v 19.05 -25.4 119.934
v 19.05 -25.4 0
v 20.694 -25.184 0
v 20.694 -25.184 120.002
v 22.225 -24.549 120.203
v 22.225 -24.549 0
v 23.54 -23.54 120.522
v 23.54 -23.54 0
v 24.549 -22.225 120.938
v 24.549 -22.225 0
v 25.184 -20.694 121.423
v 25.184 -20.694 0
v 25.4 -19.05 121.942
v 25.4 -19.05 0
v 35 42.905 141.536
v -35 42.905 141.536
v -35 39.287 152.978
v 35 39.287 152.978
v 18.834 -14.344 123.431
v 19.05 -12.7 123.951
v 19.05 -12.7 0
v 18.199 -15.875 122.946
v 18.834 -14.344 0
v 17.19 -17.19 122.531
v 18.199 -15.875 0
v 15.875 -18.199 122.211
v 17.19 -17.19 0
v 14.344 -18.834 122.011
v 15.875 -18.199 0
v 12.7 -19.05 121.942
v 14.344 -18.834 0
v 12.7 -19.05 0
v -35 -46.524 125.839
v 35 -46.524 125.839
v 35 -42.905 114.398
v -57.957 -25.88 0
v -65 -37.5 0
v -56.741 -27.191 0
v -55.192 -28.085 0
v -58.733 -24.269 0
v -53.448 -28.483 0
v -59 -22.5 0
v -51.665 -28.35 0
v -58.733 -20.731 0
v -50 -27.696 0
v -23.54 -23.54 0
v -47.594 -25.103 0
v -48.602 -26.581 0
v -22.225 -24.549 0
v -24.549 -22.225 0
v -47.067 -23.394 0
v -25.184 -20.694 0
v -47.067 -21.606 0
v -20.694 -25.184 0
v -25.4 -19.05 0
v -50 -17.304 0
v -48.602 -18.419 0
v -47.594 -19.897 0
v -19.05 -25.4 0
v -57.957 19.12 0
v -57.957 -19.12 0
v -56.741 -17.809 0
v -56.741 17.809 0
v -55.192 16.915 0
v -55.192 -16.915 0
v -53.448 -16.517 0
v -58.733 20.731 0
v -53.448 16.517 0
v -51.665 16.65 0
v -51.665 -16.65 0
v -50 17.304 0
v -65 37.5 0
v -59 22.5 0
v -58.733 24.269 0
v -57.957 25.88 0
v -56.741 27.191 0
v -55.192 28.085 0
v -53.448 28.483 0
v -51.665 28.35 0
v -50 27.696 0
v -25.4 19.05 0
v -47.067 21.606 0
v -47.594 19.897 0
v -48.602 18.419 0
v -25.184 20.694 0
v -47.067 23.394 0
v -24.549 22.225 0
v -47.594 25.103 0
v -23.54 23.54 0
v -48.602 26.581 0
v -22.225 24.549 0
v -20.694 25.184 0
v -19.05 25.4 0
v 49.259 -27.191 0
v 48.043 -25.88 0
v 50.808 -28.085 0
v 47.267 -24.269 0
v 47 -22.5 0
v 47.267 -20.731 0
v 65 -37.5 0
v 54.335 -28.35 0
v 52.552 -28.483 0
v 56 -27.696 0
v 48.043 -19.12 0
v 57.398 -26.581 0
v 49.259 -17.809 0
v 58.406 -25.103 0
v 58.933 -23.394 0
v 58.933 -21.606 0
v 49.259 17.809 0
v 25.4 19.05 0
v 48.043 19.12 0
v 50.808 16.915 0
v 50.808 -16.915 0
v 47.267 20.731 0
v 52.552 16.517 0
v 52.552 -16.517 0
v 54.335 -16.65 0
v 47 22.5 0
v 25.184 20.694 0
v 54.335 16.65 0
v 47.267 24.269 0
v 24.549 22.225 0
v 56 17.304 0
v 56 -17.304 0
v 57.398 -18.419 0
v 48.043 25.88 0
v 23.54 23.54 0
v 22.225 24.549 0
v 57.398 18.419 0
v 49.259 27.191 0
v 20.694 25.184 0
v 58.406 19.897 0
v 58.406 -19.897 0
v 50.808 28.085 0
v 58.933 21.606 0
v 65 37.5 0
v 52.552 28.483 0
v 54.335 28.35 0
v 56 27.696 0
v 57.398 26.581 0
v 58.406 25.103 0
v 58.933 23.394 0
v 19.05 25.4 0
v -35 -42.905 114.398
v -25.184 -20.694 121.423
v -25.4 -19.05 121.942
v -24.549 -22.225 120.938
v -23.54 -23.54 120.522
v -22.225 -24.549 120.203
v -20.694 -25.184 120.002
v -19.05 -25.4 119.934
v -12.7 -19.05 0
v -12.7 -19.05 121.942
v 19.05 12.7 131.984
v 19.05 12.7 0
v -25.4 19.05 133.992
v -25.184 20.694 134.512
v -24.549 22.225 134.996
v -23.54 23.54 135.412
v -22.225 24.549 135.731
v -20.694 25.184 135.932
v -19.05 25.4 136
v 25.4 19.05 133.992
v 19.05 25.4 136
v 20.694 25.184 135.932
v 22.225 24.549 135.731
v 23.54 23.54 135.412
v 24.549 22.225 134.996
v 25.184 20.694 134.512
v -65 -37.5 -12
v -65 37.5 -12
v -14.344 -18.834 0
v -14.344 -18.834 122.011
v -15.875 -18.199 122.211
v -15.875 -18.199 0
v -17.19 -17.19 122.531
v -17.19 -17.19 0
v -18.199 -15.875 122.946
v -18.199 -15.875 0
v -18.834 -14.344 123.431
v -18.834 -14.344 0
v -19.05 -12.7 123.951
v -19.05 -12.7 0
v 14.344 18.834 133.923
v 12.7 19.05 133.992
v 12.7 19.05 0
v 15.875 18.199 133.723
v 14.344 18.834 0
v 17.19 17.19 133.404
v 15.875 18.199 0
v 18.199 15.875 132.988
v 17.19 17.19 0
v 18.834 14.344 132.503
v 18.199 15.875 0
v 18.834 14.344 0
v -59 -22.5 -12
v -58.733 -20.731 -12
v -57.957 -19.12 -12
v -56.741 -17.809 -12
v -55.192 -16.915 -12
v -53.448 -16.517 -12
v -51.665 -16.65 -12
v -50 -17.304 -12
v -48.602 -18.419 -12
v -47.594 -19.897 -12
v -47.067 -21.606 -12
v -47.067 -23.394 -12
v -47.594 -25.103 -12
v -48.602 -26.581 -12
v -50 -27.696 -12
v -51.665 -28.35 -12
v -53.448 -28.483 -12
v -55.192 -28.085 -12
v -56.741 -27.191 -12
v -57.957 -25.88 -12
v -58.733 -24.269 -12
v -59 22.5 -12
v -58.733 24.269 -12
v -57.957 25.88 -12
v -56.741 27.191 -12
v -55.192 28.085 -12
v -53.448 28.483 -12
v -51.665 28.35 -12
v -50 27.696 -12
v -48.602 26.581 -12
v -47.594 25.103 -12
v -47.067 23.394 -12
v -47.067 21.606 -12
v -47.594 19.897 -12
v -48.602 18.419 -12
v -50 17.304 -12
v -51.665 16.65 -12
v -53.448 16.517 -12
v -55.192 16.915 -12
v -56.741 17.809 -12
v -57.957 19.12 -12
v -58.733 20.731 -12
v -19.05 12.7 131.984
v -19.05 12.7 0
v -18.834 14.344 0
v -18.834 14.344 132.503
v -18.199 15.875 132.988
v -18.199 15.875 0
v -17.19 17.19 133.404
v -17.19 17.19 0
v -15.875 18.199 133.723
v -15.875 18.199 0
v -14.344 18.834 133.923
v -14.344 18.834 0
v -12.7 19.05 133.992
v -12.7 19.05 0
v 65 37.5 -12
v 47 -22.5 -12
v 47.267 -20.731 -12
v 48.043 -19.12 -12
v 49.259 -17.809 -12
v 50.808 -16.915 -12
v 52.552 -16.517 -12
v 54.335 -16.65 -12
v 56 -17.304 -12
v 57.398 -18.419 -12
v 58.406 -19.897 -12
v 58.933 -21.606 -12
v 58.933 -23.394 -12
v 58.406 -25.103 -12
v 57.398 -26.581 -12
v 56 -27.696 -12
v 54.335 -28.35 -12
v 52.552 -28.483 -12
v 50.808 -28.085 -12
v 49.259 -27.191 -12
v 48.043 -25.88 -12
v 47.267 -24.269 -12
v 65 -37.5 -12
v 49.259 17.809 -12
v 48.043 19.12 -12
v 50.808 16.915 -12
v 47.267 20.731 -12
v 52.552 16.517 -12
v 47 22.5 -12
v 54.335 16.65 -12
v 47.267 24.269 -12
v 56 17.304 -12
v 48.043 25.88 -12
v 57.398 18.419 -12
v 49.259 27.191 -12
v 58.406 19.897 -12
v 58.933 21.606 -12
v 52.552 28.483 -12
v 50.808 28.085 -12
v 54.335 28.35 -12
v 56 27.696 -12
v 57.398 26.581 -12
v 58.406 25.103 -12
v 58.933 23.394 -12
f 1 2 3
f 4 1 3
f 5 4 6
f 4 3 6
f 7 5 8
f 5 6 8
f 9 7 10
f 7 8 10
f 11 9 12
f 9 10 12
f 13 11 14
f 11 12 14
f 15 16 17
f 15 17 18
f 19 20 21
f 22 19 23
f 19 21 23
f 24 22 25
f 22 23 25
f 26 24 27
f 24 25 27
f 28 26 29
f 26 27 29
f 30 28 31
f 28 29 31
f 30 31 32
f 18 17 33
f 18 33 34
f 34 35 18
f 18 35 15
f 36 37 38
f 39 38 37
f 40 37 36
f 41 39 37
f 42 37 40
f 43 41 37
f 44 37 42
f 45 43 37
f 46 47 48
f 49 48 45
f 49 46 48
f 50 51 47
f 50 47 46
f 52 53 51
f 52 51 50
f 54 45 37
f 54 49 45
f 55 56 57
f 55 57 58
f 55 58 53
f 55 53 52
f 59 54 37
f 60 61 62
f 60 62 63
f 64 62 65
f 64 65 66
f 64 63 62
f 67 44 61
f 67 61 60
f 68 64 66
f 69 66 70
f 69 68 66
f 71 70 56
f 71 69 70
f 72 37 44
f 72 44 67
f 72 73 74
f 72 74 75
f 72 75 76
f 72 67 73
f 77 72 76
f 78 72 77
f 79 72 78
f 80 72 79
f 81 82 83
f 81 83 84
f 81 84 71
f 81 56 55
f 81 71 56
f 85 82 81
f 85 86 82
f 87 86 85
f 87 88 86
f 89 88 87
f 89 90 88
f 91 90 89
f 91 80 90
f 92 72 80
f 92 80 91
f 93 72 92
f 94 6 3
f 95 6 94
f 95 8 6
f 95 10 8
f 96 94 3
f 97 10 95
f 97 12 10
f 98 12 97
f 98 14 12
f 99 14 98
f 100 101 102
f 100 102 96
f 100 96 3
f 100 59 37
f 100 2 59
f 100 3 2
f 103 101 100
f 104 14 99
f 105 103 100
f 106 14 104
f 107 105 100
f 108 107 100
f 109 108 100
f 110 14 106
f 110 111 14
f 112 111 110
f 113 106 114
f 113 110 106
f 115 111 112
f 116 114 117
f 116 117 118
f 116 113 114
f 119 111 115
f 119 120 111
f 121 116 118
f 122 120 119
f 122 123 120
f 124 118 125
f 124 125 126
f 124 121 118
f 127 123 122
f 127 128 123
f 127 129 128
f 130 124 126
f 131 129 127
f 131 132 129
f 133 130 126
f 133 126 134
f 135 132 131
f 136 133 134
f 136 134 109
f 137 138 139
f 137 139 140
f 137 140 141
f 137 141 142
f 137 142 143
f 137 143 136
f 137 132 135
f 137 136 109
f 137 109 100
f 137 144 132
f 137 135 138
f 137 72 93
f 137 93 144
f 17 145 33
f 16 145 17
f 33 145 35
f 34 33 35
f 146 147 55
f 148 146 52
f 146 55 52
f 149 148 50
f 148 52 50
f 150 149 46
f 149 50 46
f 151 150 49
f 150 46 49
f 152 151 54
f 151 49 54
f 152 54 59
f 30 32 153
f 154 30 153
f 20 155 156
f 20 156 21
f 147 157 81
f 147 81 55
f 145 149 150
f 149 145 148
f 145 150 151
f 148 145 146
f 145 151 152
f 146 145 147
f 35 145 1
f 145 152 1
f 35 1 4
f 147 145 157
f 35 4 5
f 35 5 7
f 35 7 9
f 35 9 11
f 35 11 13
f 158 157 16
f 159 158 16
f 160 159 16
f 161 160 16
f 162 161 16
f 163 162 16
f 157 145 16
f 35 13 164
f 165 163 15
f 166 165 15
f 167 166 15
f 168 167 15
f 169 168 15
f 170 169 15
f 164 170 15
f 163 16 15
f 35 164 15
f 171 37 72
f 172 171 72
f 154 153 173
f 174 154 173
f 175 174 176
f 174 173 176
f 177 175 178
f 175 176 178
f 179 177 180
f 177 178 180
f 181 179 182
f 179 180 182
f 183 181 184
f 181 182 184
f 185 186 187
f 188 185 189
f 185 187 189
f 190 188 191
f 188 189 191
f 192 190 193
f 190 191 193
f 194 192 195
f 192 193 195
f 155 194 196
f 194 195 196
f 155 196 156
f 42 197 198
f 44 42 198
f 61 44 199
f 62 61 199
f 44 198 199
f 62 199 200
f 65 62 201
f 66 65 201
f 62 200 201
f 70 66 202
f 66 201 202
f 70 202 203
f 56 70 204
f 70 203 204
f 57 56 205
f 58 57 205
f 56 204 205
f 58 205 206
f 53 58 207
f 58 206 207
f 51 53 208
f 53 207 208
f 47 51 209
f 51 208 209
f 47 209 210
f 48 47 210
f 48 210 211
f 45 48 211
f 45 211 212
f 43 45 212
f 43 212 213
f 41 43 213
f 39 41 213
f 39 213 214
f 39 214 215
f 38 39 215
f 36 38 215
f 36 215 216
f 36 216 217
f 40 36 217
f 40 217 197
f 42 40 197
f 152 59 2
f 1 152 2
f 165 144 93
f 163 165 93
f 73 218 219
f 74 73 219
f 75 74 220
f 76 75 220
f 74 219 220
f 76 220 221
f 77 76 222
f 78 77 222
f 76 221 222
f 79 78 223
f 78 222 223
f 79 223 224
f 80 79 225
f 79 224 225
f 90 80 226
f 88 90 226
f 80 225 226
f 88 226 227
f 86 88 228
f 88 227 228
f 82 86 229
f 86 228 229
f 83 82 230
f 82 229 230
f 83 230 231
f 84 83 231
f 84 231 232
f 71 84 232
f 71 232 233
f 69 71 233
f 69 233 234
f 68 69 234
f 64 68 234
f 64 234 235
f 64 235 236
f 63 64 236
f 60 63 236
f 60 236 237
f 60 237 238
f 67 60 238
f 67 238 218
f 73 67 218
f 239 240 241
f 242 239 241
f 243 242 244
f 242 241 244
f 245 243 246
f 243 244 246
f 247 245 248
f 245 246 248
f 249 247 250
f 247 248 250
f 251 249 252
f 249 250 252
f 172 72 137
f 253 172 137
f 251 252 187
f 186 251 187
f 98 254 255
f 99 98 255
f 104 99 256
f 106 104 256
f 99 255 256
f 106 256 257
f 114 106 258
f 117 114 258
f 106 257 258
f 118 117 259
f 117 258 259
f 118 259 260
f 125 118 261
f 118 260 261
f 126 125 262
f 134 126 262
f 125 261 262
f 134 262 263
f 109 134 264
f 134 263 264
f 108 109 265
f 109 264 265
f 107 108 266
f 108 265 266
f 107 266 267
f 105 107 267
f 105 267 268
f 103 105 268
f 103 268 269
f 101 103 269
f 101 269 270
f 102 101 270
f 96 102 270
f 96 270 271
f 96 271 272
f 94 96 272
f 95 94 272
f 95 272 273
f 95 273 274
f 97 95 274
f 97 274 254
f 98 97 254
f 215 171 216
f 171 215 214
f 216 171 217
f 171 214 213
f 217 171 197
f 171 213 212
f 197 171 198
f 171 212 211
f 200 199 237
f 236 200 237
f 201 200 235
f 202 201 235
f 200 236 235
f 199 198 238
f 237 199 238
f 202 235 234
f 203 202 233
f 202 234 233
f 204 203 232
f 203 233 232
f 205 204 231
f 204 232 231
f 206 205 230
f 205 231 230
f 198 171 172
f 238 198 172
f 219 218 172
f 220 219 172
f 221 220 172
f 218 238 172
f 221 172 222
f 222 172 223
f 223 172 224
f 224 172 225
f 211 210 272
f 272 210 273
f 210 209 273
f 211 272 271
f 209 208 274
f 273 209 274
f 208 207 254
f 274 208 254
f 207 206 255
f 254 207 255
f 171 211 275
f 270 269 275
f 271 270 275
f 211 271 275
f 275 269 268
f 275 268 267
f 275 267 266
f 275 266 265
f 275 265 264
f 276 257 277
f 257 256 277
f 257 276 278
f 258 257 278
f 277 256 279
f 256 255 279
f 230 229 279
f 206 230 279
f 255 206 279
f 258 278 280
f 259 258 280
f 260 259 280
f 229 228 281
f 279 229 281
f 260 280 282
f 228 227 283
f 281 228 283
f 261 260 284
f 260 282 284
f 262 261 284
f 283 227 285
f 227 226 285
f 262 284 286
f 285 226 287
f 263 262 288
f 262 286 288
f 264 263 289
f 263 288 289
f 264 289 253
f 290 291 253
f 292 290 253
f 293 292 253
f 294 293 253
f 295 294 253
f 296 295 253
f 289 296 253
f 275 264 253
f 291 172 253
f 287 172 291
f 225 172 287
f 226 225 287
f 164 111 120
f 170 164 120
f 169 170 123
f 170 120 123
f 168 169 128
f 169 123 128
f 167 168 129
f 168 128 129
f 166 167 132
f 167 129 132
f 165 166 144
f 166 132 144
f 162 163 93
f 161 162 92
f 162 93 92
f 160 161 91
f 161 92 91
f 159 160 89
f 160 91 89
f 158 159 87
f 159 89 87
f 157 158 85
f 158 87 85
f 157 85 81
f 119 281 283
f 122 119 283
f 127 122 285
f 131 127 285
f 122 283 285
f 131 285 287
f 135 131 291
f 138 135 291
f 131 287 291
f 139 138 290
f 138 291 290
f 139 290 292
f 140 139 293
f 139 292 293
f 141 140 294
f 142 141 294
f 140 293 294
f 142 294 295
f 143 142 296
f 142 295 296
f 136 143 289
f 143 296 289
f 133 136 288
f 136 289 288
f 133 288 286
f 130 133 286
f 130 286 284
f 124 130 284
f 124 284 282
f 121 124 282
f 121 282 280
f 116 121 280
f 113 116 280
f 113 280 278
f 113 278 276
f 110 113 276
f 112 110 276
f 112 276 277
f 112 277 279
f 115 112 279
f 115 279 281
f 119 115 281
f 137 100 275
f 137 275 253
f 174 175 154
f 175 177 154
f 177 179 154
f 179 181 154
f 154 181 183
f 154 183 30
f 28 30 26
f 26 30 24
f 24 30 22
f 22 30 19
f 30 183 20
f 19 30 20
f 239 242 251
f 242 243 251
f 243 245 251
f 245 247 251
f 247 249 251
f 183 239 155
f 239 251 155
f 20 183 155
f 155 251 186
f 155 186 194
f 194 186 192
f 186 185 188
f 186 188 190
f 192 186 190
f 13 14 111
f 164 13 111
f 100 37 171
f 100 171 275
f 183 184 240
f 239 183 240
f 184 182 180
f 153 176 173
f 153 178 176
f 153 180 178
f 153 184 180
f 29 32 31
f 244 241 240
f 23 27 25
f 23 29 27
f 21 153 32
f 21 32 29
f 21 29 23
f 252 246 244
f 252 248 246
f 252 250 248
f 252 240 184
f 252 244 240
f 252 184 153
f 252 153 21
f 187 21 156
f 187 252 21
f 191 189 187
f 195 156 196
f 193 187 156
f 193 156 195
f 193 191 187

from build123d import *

# Parameters (mm, degrees)
F0_W     = 130
F0_H     = 75
F1_DEPTH = 12
F3_DEPTH = 136
F5_D     = 12
F7_DEPTH = 50.8
F8_W     = 70
F8_H     = 90
F9_DEPTH = 12


with BuildPart() as f1:
    # F0 (on Top) → F1 (new body)
    with BuildSketch(Plane.XY):
        Rectangle(F0_W, F0_H)
    extrude(amount=-F1_DEPTH)

    # F2 (on face) → F3 (join)
    with BuildSketch(Plane.XY):
        with BuildLine():
            Line((-19.05, -25.4), (19.05, -25.4))
            ThreePointArc((19.05, -25.4), (23.5401280605, -23.5401280605), (25.4, -19.05))
            Line((25.4, -19.05), (25.4, 19.05))
            ThreePointArc((25.4, 19.05), (23.5401280605, 23.5401280605), (19.05, 25.4))
            Line((19.05, 25.4), (-19.05, 25.4))
            ThreePointArc((-19.05, 25.4), (-23.5401280605, 23.5401280605), (-25.4, 19.05))
            Line((-25.4, 19.05), (-25.4, -19.05))
            ThreePointArc((-25.4, -19.05), (-23.5401280605, -23.5401280605), (-19.05, -25.4))
        make_face()
        with BuildLine():
            Line((-12.7, 19.05), (12.7, 19.05))
            ThreePointArc((12.7, 19.05), (17.1901280605, 17.1901280605), (19.05, 12.7))
            Line((19.05, 12.7), (19.05, -12.7))
            ThreePointArc((19.05, -12.7), (17.1901280605, -17.1901280605), (12.7, -19.05))
            Line((12.7, -19.05), (-12.7, -19.05))
            ThreePointArc((-12.7, -19.05), (-17.1901280605, -17.1901280605), (-19.05, -12.7))
            Line((-19.05, -12.7), (-19.05, 12.7))
            ThreePointArc((-19.05, 12.7), (-17.1901280605, 17.1901280605), (-12.7, 19.05))
        make_face(mode=Mode.SUBTRACT)
    extrude(amount=F3_DEPTH)

    # F5 (through all)
    with Locations(Plane.XY):
        with Locations((-53, 22.5), (53, 22.5), (53, -22.5), (-53, -22.5)):
            Hole(F5_D / 2)

    # F6 (on face) → F7 (cut)
    with BuildSketch(Plane.YZ.offset(25.4)):
        Polygon((-19.05, 136), (-25.4, 136), (-25.4, 119.9340696072), (-19.05, 121.9423109063), align=None)
        Polygon((19.05, 136), (-19.05, 136), (-19.05, 121.9423109063), (19.05, 133.9917587009), align=None)
        Polygon((25.4, 136), (19.05, 136), (19.05, 133.9917587009), align=None)
    extrude(amount=-F7_DEPTH, mode=Mode.SUBTRACT)

    # F8 (on face) → F9 (join)
    with BuildSketch(Plane(origin=(0, -36.7908585502, 116.331614084), x_dir=(1, 0, 0), z_dir=(0, -0.3015379599, 0.9534541723))):
        with Locations((0, 38.5869186148)):
            Rectangle(F8_W, F8_H)
        with BuildLine():
            Line((25.4, 58.5669035507), (25.4, 18.6069336789))
            add(Edge.make_bspline(
                [(25.4, 18.6069336789), (25.4, 11.9469387003), (19.05, 11.9469387003)],
                knots=[4.7123889804, 4.7123889804, 4.7123889804, 6.2831853072, 6.2831853072, 6.2831853072], degree=2, weights=[1, 0.7071067812, 1]))
            Line((19.05, 11.9469387003), (-19.05, 11.9469387003))
            add(Edge.make_bspline(
                [(-19.05, 11.9469387003), (-25.4, 11.9469387003), (-25.4, 18.6069336789)],
                knots=[0, 0, 0, 1.5707963268, 1.5707963268, 1.5707963268], degree=2, weights=[1, 0.7071067812, 1]))
            Line((-25.4, 18.6069336789), (-25.4, 58.5669035507))
            add(Edge.make_bspline(
                [(-25.4, 58.5669035507), (-25.4, 65.2268985294), (-19.05, 65.2268985294)],
                knots=[1.5707963268, 1.5707963268, 1.5707963268, 3.1415926536, 3.1415926536, 3.1415926536], degree=2, weights=[1, 0.7071067812, 1]))
            Line((-19.05, 65.2268985294), (19.05, 65.2268985294))
            add(Edge.make_bspline(
                [(19.05, 65.2268985294), (25.4, 65.2268985294), (25.4, 58.5669035507)],
                knots=[3.1415926536, 3.1415926536, 3.1415926536, 4.7123889804, 4.7123889804, 4.7123889804], degree=2, weights=[1, 0.7071067812, 1]))
        make_face(mode=Mode.SUBTRACT)
        with BuildLine():
            add(Edge.make_bspline(
                [(25.4, 18.6069336789), (25.4, 11.9469387003), (19.05, 11.9469387003)],
                knots=[4.7123889804, 4.7123889804, 4.7123889804, 6.2831853072, 6.2831853072, 6.2831853072], degree=2, weights=[1, 0.7071067812, 1]))
            Line((25.4, 18.6069336789), (25.4, 58.5669035507))
            add(Edge.make_bspline(
                [(19.05, 65.2268985294), (25.4, 65.2268985294), (25.4, 58.5669035507)],
                knots=[3.1415926536, 3.1415926536, 3.1415926536, 4.7123889804, 4.7123889804, 4.7123889804], degree=2, weights=[1, 0.7071067812, 1]))
            Line((19.05, 65.2268985294), (-19.05, 65.2268985294))
            add(Edge.make_bspline(
                [(-25.4, 58.5669035507), (-25.4, 65.2268985294), (-19.05, 65.2268985294)],
                knots=[1.5707963268, 1.5707963268, 1.5707963268, 3.1415926536, 3.1415926536, 3.1415926536], degree=2, weights=[1, 0.7071067812, 1]))
            Line((-25.4, 58.5669035507), (-25.4, 18.6069336789))
            add(Edge.make_bspline(
                [(-19.05, 11.9469387003), (-25.4, 11.9469387003), (-25.4, 18.6069336789)],
                knots=[0, 0, 0, 1.5707963268, 1.5707963268, 1.5707963268], degree=2, weights=[1, 0.7071067812, 1]))
            Line((-19.05, 11.9469387003), (19.05, 11.9469387003))
        make_face()
        with BuildLine():
            Line((-19.05, 25.2669286576), (-19.05, 51.9069085721))
            add(Edge.make_bspline(
                [(-19.05, 51.9069085721), (-19.05, 58.5669035507), (-12.7, 58.5669035507)],
                knots=[1.5707963268, 1.5707963268, 1.5707963268, 3.1415926536, 3.1415926536, 3.1415926536], degree=2, weights=[1, 0.7071067812, 1]))
            Line((-12.7, 58.5669035507), (12.7, 58.5669035507))
            add(Edge.make_bspline(
                [(12.7, 58.5669035507), (19.05, 58.5669035507), (19.05, 51.9069085721)],
                knots=[3.1415926536, 3.1415926536, 3.1415926536, 4.7123889804, 4.7123889804, 4.7123889804], degree=2, weights=[1, 0.7071067812, 1]))
            Line((19.05, 51.9069085721), (19.05, 25.2669286576))
            add(Edge.make_bspline(
                [(19.05, 25.2669286576), (19.05, 18.6069336789), (12.7, 18.6069336789)],
                knots=[4.7123889804, 4.7123889804, 4.7123889804, 6.2831853072, 6.2831853072, 6.2831853072], degree=2, weights=[1, 0.7071067812, 1]))
            Line((12.7, 18.6069336789), (-12.7, 18.6069336789))
            add(Edge.make_bspline(
                [(-12.7, 18.6069336789), (-19.05, 18.6069336789), (-19.05, 25.2669286576)],
                knots=[0, 0, 0, 1.5707963268, 1.5707963268, 1.5707963268], degree=2, weights=[1, 0.7071067812, 1]))
        make_face(mode=Mode.SUBTRACT)
        with BuildLine():
            add(Edge.make_bspline(
                [(-19.05, 51.9069085721), (-19.05, 58.5669035507), (-12.7, 58.5669035507)],
                knots=[1.5707963268, 1.5707963268, 1.5707963268, 3.1415926536, 3.1415926536, 3.1415926536], degree=2, weights=[1, 0.7071067812, 1]))
            Line((-19.05, 51.9069085721), (-19.05, 25.2669286576))
            add(Edge.make_bspline(
                [(-12.7, 18.6069336789), (-19.05, 18.6069336789), (-19.05, 25.2669286576)],
                knots=[0, 0, 0, 1.5707963268, 1.5707963268, 1.5707963268], degree=2, weights=[1, 0.7071067812, 1]))
            Line((-12.7, 18.6069336789), (12.7, 18.6069336789))
            add(Edge.make_bspline(
                [(19.05, 25.2669286576), (19.05, 18.6069336789), (12.7, 18.6069336789)],
                knots=[4.7123889804, 4.7123889804, 4.7123889804, 6.2831853072, 6.2831853072, 6.2831853072], degree=2, weights=[1, 0.7071067812, 1]))
            Line((19.05, 25.2669286576), (19.05, 51.9069085721))
            add(Edge.make_bspline(
                [(12.7, 58.5669035507), (19.05, 58.5669035507), (19.05, 51.9069085721)],
                knots=[3.1415926536, 3.1415926536, 3.1415926536, 4.7123889804, 4.7123889804, 4.7123889804], degree=2, weights=[1, 0.7071067812, 1]))
            Line((12.7, 58.5669035507), (-12.7, 58.5669035507))
        make_face()
    extrude(amount=F9_DEPTH)


solid = f1.part
